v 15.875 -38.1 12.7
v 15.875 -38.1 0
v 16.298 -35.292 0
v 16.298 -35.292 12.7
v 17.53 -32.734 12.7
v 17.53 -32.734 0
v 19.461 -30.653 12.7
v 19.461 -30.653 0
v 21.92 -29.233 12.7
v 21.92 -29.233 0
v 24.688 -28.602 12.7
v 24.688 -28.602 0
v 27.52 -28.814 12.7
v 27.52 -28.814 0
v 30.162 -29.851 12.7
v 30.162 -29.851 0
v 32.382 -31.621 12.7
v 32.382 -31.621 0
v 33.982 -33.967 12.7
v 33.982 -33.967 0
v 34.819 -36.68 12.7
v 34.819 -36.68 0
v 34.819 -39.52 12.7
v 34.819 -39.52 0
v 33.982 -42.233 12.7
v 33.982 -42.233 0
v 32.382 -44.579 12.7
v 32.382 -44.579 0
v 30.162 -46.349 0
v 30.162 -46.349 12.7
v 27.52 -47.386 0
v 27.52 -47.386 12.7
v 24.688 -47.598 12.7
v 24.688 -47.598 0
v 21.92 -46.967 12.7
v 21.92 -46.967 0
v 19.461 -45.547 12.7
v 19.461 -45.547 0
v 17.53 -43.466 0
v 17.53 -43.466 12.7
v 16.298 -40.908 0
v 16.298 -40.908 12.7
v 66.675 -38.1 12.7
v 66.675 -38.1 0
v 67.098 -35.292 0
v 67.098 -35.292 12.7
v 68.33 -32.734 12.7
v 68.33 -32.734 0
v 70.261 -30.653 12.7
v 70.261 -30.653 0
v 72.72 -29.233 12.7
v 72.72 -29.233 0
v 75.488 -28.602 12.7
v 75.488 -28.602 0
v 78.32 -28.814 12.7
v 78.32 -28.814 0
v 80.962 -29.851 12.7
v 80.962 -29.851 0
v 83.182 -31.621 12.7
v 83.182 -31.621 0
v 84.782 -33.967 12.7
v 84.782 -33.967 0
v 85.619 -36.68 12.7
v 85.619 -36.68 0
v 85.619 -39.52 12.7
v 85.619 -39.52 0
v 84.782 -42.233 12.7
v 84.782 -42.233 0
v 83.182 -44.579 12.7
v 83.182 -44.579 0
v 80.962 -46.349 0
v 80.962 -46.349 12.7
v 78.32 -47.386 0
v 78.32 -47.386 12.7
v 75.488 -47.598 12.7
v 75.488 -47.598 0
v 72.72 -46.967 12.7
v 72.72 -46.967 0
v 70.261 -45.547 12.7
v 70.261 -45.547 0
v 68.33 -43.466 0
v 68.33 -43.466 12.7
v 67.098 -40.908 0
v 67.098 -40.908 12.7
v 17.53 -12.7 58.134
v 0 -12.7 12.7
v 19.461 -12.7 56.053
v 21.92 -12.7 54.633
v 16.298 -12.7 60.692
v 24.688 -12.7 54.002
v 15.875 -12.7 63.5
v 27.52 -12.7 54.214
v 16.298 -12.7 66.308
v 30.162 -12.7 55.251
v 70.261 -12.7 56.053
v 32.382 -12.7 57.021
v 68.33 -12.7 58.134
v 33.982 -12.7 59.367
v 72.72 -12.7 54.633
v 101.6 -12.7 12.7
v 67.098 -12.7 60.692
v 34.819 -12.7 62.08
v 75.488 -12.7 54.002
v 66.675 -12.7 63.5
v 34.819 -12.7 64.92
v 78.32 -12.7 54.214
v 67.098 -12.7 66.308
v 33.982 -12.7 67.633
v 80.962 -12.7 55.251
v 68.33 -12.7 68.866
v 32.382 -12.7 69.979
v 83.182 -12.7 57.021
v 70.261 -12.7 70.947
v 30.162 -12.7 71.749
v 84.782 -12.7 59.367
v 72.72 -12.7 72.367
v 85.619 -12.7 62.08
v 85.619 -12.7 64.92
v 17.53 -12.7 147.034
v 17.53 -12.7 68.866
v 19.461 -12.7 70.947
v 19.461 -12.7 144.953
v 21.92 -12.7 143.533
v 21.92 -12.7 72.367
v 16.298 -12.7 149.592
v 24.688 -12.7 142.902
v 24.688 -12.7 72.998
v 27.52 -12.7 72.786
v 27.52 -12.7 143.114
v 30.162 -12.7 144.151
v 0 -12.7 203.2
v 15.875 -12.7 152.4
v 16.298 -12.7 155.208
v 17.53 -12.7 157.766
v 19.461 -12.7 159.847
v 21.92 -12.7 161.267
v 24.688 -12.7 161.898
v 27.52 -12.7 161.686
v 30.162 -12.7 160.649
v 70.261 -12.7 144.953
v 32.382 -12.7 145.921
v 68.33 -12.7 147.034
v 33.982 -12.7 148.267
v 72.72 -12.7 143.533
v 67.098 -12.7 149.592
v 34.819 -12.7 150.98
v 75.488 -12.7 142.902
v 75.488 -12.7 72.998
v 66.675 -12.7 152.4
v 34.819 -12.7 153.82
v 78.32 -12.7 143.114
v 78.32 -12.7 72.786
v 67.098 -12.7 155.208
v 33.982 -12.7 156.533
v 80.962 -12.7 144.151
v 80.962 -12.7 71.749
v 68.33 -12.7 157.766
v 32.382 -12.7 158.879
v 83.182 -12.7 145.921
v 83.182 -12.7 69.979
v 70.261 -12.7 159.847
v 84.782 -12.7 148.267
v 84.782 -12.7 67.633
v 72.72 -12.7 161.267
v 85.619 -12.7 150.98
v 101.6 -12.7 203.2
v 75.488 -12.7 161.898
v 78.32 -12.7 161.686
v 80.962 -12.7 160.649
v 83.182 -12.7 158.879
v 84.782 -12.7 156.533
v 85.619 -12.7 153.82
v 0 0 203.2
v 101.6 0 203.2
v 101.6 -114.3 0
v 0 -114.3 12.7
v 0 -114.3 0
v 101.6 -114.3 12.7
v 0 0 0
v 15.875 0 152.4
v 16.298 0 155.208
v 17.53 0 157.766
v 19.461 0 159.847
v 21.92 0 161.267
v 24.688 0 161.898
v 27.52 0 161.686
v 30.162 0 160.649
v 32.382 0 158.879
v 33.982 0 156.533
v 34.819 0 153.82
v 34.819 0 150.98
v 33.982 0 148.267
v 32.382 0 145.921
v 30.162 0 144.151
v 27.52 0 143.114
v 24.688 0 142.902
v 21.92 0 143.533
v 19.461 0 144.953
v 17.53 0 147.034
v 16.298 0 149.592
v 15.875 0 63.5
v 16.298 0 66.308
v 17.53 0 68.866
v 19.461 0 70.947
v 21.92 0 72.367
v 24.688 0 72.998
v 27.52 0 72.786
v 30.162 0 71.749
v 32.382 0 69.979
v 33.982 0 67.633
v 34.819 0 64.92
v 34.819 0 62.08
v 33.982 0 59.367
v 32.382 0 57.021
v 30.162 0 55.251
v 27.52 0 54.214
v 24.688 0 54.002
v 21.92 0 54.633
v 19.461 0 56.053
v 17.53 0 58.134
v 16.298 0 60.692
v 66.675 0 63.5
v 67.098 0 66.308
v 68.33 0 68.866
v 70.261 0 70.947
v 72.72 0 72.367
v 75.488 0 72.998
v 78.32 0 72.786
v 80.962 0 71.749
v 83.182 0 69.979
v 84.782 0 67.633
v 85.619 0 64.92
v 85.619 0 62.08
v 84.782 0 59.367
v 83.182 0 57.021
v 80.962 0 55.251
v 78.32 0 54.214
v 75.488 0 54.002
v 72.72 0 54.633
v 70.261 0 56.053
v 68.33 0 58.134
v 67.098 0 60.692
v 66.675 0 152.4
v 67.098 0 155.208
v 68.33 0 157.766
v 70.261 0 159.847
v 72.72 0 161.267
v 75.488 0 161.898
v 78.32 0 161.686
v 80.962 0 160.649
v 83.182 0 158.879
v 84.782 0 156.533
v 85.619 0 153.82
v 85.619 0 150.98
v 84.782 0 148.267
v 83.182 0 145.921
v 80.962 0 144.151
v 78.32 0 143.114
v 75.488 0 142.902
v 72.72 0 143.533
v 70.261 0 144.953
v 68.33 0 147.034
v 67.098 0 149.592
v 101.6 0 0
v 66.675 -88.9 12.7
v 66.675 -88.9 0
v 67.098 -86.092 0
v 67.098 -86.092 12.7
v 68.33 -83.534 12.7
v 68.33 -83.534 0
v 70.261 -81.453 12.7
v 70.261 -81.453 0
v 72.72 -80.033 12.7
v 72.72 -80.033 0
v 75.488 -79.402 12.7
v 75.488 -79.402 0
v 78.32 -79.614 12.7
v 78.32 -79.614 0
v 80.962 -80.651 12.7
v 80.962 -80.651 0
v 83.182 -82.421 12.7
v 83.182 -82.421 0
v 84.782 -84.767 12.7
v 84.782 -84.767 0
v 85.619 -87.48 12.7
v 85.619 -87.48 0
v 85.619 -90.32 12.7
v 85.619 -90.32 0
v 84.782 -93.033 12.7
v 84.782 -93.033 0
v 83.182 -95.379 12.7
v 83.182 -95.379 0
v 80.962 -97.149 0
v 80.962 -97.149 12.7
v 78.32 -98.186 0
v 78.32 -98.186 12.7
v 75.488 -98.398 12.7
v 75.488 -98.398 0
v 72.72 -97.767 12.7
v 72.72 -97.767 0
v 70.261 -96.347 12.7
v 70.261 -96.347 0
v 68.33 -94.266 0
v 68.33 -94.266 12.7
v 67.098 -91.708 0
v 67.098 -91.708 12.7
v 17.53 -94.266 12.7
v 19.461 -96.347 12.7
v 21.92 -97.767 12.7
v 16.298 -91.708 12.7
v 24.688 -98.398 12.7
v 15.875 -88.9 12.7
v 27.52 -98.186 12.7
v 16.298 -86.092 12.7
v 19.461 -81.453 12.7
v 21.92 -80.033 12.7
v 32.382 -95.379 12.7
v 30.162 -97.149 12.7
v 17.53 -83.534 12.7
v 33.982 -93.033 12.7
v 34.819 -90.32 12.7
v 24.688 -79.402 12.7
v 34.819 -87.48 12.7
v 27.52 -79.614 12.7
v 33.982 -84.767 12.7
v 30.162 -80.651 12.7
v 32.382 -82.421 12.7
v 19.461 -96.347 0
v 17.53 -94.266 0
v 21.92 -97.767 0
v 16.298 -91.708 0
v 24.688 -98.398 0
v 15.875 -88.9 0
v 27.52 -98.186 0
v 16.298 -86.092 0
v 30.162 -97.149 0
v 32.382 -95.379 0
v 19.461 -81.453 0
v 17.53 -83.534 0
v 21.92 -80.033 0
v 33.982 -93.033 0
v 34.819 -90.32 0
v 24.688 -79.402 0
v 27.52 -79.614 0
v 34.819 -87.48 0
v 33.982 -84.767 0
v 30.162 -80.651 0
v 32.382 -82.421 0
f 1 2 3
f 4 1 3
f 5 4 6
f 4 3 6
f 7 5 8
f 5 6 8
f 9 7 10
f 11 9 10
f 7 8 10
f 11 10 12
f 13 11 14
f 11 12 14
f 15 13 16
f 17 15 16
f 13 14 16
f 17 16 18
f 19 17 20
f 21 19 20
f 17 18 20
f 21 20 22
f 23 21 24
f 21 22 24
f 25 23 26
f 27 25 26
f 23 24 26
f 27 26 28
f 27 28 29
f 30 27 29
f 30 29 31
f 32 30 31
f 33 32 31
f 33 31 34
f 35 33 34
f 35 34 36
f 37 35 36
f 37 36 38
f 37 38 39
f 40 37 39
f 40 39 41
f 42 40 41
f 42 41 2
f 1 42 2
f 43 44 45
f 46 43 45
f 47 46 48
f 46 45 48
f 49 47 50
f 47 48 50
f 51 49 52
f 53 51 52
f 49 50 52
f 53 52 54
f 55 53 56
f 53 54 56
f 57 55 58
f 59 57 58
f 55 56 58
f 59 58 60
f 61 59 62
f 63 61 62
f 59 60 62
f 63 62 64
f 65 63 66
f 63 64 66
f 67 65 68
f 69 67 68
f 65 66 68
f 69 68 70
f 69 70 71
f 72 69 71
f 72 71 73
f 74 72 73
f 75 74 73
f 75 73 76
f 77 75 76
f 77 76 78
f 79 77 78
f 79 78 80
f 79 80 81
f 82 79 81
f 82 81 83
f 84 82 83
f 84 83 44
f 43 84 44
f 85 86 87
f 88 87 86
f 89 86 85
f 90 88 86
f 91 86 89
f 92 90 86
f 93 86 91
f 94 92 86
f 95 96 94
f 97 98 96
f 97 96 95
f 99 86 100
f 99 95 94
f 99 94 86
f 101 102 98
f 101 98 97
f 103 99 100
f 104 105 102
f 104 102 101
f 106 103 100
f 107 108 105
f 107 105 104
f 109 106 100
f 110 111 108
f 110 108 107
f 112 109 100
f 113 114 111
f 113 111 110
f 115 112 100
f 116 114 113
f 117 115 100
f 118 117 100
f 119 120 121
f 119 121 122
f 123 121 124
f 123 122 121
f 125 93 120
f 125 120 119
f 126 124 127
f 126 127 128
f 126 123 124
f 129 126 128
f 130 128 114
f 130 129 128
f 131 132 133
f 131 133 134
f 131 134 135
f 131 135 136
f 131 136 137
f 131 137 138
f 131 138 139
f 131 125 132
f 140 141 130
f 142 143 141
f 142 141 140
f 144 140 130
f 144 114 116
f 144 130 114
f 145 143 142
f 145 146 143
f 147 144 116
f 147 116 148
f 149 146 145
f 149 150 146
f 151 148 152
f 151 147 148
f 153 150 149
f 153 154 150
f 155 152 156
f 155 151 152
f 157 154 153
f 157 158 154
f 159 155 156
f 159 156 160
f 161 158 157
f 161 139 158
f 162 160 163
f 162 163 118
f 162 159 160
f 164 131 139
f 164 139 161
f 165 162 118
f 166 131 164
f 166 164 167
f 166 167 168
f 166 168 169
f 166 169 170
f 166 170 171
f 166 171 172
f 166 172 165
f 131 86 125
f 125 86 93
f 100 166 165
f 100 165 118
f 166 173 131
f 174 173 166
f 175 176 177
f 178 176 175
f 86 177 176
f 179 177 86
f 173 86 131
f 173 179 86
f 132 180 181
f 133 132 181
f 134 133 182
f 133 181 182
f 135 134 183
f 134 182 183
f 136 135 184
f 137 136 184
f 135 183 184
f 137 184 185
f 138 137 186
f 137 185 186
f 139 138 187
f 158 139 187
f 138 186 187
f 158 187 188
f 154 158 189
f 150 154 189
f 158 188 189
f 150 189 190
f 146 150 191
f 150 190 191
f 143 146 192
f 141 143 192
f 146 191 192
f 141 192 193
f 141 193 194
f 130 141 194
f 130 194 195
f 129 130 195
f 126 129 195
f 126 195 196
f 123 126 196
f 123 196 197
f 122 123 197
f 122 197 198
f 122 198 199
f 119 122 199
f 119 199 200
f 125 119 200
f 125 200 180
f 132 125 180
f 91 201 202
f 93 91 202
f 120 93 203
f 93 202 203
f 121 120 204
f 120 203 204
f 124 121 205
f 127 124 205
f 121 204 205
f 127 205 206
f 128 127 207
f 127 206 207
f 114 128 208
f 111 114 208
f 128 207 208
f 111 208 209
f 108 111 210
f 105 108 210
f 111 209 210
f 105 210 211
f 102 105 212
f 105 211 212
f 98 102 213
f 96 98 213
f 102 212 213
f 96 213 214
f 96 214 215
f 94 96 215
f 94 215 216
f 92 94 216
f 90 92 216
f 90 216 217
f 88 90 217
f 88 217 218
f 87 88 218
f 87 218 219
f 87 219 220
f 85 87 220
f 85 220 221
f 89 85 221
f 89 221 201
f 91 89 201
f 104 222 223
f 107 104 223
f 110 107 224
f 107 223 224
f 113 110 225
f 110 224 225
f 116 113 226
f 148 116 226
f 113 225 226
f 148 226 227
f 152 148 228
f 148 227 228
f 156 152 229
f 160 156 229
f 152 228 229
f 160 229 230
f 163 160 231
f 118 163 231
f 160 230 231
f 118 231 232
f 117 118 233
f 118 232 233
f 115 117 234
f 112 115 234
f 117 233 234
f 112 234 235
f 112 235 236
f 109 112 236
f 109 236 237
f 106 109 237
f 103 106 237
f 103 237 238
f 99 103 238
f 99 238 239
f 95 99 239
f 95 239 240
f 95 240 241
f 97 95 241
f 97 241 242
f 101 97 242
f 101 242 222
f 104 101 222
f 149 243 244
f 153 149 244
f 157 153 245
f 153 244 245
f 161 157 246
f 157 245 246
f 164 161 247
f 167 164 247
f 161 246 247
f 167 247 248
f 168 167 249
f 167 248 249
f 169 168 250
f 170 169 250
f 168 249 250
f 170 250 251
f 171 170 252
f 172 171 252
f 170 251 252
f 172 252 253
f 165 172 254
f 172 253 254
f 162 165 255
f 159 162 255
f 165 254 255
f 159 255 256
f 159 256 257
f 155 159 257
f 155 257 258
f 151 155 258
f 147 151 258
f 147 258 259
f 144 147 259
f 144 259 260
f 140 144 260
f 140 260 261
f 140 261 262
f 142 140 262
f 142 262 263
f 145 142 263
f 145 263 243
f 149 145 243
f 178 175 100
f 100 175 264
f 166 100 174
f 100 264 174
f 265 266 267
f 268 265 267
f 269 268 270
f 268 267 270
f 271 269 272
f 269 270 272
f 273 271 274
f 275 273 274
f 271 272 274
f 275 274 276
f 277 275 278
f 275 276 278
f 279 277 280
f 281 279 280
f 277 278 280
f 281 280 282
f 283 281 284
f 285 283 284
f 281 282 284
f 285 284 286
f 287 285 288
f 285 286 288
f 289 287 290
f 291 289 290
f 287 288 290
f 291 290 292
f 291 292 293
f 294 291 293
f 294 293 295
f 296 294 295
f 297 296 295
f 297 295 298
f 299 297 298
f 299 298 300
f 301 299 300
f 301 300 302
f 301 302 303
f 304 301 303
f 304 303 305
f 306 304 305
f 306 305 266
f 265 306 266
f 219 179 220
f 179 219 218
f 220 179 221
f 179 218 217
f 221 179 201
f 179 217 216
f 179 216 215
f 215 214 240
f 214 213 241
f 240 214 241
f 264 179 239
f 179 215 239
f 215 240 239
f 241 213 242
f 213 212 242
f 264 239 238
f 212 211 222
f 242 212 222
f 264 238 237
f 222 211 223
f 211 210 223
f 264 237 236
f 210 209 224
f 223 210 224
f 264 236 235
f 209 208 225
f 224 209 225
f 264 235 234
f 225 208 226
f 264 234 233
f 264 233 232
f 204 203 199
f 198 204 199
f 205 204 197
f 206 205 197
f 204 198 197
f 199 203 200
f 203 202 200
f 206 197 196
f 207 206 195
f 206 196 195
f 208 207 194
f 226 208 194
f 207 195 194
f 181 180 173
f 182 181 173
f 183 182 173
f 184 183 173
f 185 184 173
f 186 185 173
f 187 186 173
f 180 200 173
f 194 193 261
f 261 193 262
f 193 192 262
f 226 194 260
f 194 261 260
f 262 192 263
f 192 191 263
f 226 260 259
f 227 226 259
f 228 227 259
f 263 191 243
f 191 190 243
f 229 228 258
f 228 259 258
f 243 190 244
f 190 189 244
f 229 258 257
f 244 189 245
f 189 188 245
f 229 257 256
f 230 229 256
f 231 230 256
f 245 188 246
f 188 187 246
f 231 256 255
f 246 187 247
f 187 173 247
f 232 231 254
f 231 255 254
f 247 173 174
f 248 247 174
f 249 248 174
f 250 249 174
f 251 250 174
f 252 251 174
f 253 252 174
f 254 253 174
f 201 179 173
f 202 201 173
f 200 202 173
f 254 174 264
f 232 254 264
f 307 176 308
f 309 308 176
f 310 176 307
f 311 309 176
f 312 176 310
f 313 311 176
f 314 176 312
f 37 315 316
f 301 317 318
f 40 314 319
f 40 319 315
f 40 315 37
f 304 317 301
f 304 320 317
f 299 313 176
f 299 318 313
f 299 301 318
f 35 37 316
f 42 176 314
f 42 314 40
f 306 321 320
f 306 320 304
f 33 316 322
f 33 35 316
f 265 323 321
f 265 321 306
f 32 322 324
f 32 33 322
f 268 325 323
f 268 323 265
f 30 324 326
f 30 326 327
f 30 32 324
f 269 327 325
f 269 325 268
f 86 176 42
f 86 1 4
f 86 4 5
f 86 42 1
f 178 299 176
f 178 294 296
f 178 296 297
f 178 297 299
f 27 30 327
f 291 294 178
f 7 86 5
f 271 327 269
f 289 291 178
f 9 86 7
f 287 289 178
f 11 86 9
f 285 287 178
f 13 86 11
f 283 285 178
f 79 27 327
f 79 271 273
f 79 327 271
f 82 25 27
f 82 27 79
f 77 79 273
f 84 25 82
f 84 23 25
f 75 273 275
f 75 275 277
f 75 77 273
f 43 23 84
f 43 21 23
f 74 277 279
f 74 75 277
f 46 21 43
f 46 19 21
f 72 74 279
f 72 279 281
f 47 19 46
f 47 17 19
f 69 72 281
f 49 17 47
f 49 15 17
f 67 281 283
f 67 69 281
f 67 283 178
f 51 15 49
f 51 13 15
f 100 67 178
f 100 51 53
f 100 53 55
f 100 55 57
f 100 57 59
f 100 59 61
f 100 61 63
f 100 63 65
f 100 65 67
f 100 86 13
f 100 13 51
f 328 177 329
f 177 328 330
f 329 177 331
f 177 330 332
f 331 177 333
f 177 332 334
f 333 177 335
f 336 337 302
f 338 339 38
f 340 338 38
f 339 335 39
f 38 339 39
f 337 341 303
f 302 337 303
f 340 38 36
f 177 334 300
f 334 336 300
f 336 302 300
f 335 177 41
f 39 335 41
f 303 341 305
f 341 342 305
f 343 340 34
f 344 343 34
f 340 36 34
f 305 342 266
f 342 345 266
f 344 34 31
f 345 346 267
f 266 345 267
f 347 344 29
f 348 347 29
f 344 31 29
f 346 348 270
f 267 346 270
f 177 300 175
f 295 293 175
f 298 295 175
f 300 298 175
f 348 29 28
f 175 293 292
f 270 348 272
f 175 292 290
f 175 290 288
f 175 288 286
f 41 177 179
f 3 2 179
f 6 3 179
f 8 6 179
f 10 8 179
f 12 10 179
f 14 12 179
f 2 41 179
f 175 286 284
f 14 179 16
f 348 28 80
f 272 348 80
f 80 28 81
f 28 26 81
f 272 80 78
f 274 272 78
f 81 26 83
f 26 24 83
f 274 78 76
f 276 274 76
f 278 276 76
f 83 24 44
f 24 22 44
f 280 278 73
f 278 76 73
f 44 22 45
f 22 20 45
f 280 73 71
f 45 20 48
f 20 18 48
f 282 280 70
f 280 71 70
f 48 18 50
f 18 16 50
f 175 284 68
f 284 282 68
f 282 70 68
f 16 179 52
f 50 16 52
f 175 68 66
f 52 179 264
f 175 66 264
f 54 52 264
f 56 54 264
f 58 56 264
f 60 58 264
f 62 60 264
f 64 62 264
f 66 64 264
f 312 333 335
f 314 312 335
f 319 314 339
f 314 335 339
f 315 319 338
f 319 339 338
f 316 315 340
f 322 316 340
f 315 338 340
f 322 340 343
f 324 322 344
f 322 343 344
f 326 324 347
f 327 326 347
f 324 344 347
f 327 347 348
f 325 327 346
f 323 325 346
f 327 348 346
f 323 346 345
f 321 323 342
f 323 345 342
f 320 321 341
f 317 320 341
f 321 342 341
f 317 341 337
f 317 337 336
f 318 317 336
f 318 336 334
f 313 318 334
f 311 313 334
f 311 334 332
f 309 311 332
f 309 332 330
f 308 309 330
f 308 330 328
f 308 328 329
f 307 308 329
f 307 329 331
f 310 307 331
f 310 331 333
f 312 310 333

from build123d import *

# Parameters (mm, degrees)
F0_W     = 101.6
F0_H     = 203.2
F1_DEPTH = 12.7
F2_W     = 101.6
F2_H     = 12.7
F3_DEPTH = 101.6
F5_D     = 19.05
F5_DEPTH = 12.7
F7_D     = 19.05
F7_DEPTH = 12.7
F9_D     = 19.05
F9_DEPTH = 12.7


with BuildPart() as f1:
    # F0 (on Front) → F1 (new body)
    with BuildSketch(Plane.XZ):
        with Locations((50.8, 101.6)):
            Rectangle(F0_W, F0_H)
    extrude(amount=F1_DEPTH)

    # F2 (on face) → F3 (join)
    with BuildSketch(Plane.XZ.offset(12.7)):
        with Locations((50.8, 6.35)):
            Rectangle(F2_W, F2_H)
    extrude(amount=F3_DEPTH)

    # F5
    with Locations(Plane.XY.offset(12.7)):
        with Locations((25.4, -88.9)):
            Hole(F5_D / 2, depth=F5_DEPTH)

    # F7
    with Locations(Plane.XY.offset(12.7)):
        with Locations((25.4, -38.1), (76.2, -38.1), (76.2, -88.9)):
            Hole(F7_D / 2, depth=F7_DEPTH)

    # F9
    with Locations(Plane.XZ.offset(12.7)):
        with Locations((25.4, 152.4), (76.2, 152.4), (76.2, 63.5), (25.4, 63.5)):
            Hole(F9_D / 2, depth=F9_DEPTH)


solid = f1.part
